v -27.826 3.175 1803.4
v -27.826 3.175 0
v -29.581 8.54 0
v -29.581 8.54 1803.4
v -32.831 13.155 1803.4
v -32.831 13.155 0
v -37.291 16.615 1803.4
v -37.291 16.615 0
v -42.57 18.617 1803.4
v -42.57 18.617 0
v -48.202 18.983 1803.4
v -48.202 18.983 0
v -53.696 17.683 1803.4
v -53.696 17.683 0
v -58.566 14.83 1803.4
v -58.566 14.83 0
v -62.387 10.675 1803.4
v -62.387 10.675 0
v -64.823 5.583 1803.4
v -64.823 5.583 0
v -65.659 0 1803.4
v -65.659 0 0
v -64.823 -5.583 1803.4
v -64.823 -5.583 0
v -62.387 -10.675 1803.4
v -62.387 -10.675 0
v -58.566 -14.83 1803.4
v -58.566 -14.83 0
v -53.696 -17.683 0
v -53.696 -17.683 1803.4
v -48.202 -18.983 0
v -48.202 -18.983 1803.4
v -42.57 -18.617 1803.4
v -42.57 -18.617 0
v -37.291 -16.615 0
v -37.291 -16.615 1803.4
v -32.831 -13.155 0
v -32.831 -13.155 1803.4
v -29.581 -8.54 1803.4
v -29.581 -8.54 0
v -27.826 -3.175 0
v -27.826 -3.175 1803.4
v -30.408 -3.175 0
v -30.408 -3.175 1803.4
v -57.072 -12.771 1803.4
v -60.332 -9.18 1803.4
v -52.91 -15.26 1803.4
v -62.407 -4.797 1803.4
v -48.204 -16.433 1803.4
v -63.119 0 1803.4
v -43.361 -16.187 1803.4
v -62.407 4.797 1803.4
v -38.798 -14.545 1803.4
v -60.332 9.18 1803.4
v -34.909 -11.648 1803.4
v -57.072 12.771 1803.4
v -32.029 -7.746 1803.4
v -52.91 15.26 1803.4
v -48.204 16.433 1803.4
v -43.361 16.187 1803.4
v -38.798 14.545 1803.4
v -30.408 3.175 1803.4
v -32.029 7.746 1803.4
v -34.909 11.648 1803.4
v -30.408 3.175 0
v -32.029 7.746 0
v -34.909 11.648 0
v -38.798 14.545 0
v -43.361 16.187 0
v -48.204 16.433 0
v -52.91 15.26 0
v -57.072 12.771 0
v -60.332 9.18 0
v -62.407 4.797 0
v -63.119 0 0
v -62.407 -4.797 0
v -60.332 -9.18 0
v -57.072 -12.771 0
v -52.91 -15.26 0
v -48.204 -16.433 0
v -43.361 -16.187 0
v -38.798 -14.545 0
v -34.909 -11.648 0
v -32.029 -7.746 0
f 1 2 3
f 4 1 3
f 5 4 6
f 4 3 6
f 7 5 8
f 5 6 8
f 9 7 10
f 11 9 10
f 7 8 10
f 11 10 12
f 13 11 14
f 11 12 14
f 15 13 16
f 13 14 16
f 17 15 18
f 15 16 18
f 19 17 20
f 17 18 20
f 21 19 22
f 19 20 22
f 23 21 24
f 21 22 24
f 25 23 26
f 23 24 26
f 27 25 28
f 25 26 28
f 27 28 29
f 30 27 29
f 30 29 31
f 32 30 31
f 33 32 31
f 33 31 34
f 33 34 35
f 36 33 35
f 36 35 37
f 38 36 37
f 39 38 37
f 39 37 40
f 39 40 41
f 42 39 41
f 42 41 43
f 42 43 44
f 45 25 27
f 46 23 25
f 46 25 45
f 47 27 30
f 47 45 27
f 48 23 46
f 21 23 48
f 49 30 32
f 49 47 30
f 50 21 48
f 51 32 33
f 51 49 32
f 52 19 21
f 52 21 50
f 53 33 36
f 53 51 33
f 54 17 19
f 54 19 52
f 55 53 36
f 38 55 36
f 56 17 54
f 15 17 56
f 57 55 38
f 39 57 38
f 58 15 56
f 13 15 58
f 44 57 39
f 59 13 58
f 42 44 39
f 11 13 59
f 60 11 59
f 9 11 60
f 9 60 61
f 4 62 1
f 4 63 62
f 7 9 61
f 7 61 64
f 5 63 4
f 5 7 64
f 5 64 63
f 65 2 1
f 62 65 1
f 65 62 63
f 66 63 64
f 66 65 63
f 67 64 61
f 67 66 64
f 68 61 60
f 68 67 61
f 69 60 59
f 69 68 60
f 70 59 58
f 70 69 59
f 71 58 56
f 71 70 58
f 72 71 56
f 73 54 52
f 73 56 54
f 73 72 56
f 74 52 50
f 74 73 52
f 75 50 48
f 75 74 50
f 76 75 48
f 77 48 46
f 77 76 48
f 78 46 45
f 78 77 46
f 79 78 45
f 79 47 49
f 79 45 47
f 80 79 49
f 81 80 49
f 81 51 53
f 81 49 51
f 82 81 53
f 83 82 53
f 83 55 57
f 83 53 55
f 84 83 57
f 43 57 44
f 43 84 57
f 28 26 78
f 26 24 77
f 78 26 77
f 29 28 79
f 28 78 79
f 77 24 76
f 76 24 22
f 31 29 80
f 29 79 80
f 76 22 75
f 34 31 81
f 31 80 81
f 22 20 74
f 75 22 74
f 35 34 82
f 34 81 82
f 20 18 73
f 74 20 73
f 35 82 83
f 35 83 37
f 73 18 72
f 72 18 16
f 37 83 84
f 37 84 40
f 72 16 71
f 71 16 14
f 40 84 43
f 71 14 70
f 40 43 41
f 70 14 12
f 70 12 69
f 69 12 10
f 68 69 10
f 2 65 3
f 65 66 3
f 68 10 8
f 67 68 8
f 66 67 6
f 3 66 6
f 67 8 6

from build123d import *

# Parameters (mm, degrees)
F0_R      = 19.05
F1_DEPTH  = 1828.8
F2_T      = -2.54
F1_FACE_R = 19.05
F3_DEPTH  = 25.4
F5_W      = 6.35
F5_H      = 30480
F6_DEPTH  = 25.4


with BuildPart() as f1:
    # F0 (on Top) → F1 (new body)
    with BuildSketch(Plane.XY):
        with Locations((-46.609409, 0)):
            Circle(F0_R)
    extrude(amount=F1_DEPTH)

    # F2
    f2_openings = [f1.faces().sort_by_distance(p)[0] for p in [
        (-46.609409, 0, 0),
    ]]
    offset(amount=F2_T, openings=f2_openings)

    # F1_face (on face) → F3 (cut)
    with BuildSketch(Plane(origin=(-46.609409, 0, 1828.8), x_dir=(1, 0, 0), z_dir=(0, 0, 1))):
        Circle(F1_FACE_R)
    extrude(amount=-F3_DEPTH, mode=Mode.SUBTRACT)

    # F5 (on offset) → F6 (cut)
    with BuildSketch(Plane.YZ.offset(-25.4)):
        with Locations((0, 2198.531465)):
            Rectangle(F5_W, F5_H)
    extrude(amount=-F6_DEPTH, mode=Mode.SUBTRACT)


solid = f1.part
